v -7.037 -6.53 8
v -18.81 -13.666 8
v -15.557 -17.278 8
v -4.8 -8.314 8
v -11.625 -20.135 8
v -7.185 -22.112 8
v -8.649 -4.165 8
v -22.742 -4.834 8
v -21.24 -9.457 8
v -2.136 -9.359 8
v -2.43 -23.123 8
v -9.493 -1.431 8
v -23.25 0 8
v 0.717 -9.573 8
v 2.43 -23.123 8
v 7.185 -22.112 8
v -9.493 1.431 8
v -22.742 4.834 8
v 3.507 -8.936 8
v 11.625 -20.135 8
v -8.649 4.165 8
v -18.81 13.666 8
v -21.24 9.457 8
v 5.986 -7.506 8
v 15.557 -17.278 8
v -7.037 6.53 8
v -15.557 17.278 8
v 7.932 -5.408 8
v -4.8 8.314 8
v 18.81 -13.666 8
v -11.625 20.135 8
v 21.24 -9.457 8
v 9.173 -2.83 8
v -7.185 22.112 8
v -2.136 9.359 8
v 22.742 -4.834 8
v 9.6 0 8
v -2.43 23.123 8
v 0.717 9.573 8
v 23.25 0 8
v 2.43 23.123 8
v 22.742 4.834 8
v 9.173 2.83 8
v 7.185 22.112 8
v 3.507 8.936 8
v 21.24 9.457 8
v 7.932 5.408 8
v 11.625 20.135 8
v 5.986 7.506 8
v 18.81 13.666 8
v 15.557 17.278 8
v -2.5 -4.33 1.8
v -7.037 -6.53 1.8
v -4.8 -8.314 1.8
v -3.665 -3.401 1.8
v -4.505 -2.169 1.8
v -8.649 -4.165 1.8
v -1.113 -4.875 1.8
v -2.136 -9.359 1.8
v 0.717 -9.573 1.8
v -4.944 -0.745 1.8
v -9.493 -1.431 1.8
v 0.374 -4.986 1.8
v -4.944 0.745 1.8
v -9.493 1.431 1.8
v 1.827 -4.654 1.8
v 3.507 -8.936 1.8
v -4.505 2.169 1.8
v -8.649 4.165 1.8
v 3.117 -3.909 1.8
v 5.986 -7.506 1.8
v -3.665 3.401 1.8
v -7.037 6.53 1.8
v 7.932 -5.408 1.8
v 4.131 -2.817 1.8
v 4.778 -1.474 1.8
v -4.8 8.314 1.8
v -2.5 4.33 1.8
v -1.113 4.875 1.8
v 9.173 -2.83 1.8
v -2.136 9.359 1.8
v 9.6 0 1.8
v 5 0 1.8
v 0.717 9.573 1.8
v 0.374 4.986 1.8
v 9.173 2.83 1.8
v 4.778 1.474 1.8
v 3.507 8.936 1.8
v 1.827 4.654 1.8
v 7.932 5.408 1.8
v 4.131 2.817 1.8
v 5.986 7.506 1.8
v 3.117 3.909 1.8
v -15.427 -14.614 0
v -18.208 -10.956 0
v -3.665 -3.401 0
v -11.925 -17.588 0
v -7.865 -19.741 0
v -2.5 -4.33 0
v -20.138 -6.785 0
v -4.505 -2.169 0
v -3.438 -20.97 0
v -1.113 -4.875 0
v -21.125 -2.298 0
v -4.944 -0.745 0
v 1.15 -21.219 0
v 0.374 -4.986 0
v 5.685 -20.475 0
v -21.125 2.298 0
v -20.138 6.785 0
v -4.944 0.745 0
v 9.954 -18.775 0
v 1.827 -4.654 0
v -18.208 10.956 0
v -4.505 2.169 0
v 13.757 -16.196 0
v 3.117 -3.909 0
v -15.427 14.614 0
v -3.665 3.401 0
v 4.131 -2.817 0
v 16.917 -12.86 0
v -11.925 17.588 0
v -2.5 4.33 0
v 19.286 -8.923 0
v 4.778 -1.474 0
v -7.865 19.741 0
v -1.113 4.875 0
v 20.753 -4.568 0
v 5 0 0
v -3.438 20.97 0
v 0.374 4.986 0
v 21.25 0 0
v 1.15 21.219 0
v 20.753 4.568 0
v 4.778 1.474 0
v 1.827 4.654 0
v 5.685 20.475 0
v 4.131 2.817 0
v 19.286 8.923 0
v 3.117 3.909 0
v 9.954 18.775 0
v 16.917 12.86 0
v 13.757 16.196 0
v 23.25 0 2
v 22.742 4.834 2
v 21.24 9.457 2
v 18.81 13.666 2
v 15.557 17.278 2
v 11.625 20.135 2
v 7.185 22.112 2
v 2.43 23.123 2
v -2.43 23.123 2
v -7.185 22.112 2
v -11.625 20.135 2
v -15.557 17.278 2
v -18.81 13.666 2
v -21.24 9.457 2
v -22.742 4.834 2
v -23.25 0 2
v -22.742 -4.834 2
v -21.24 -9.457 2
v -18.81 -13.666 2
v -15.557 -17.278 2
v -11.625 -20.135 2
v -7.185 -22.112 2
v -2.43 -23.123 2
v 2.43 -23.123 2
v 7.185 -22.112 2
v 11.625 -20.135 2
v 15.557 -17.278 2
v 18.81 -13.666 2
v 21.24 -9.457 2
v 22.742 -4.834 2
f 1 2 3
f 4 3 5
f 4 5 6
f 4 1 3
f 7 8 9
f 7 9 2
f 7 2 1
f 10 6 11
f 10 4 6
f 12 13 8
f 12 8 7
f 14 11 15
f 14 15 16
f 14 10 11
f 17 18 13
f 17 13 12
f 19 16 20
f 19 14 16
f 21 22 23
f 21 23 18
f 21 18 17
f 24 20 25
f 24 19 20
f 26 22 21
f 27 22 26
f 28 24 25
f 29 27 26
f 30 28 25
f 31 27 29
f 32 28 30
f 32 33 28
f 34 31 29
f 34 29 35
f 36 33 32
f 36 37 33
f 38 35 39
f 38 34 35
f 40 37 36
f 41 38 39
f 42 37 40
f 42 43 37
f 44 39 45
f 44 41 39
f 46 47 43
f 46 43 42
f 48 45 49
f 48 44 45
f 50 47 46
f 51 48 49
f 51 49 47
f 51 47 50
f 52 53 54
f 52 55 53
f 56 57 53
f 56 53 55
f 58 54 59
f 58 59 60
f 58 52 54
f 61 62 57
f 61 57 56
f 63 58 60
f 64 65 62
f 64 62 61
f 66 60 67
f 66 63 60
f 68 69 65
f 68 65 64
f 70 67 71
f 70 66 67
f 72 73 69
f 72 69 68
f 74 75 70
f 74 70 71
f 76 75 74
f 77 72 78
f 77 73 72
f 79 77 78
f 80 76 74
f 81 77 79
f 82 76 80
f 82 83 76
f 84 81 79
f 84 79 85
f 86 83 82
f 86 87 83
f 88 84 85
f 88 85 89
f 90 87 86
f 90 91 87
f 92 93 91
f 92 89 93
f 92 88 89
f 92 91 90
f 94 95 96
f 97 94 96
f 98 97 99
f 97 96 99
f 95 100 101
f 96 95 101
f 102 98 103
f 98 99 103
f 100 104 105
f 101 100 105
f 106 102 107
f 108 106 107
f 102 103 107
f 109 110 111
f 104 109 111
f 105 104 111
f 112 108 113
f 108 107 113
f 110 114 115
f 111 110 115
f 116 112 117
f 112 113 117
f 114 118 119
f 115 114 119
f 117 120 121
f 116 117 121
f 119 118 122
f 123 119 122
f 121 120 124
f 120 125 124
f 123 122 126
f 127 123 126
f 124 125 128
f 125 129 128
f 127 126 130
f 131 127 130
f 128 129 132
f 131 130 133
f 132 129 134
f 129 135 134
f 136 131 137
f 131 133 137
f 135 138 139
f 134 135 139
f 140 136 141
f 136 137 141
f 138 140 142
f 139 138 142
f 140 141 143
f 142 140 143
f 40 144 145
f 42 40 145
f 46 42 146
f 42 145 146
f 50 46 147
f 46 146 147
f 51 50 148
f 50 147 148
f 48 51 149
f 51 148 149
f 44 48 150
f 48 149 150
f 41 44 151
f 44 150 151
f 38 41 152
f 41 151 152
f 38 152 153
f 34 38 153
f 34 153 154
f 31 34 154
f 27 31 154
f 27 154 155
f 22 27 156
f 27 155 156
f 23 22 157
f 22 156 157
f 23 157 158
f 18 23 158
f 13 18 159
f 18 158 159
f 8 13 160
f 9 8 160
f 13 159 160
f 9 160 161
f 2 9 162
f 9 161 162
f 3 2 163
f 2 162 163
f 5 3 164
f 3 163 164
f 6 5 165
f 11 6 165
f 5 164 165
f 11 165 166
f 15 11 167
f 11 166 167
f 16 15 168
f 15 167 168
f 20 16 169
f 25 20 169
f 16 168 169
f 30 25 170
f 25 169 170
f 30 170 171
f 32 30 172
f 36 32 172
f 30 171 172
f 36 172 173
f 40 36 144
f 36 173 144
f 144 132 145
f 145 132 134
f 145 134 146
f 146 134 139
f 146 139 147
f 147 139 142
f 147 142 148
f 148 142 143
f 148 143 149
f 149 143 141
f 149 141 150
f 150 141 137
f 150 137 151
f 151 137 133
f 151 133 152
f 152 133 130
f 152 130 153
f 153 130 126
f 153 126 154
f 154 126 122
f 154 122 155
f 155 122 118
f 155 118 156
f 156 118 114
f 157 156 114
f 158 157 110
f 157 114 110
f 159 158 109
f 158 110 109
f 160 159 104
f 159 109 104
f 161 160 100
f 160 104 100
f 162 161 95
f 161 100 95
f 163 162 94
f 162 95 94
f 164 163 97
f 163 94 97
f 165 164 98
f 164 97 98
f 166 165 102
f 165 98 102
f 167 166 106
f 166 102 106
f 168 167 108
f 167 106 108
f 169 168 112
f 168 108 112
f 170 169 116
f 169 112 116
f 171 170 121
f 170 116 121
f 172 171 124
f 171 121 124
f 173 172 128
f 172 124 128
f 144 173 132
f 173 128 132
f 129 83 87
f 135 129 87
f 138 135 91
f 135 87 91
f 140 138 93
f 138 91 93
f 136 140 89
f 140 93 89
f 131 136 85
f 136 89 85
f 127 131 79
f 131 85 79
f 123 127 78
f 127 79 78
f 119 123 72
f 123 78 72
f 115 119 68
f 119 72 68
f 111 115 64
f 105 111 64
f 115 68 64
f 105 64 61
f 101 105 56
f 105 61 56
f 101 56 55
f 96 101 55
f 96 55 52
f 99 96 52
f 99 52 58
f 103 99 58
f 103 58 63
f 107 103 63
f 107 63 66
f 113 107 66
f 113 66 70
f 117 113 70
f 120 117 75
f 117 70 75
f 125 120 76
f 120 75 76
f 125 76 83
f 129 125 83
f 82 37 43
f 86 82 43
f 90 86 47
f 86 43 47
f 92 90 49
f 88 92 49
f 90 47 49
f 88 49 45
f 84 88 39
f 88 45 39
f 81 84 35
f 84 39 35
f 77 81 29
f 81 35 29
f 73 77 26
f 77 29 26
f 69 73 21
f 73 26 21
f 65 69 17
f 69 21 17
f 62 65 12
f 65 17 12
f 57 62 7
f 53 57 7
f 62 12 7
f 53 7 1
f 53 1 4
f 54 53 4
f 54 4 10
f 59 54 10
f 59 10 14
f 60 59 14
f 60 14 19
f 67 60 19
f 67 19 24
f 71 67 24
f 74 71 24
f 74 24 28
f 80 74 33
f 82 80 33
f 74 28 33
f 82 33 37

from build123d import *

# Parameters (mm, degrees)
SKETCH1_R           = 23.25
BOSS_EXTRUDE1_DEPTH = 8
SKETCH2_R           = 9.6
CUT_EXTRUDE1_DEPTH  = 6.2
SKETCH3_R           = 5
CUT_EXTRUDE2_DEPTH  = 1.8
CHAMFER1_SIZE       = 2


with BuildPart() as part:
    # Sketch1 → Boss-Extrude1 (new body)
    with BuildSketch(Plane.XY):
        Circle(SKETCH1_R)
    extrude(amount=BOSS_EXTRUDE1_DEPTH)

    # Sketch2 → Cut-Extrude1 (cut)
    with BuildSketch(Plane.XY.offset(8)):
        Circle(SKETCH2_R)
    extrude(amount=-CUT_EXTRUDE1_DEPTH, mode=Mode.SUBTRACT)

    # Sketch3 → Cut-Extrude2 (cut)
    with BuildSketch(Plane.XY.offset(1.8)):
        Circle(SKETCH3_R)
    extrude(amount=-CUT_EXTRUDE2_DEPTH, mode=Mode.SUBTRACT)

    # Chamfer1
    chamfer1_edges = [part.edges().sort_by_distance(p)[0] for p in [
        (-23.25, 0, 0),
    ]]
    chamfer(chamfer1_edges, length=CHAMFER1_SIZE)


solid = part.part
